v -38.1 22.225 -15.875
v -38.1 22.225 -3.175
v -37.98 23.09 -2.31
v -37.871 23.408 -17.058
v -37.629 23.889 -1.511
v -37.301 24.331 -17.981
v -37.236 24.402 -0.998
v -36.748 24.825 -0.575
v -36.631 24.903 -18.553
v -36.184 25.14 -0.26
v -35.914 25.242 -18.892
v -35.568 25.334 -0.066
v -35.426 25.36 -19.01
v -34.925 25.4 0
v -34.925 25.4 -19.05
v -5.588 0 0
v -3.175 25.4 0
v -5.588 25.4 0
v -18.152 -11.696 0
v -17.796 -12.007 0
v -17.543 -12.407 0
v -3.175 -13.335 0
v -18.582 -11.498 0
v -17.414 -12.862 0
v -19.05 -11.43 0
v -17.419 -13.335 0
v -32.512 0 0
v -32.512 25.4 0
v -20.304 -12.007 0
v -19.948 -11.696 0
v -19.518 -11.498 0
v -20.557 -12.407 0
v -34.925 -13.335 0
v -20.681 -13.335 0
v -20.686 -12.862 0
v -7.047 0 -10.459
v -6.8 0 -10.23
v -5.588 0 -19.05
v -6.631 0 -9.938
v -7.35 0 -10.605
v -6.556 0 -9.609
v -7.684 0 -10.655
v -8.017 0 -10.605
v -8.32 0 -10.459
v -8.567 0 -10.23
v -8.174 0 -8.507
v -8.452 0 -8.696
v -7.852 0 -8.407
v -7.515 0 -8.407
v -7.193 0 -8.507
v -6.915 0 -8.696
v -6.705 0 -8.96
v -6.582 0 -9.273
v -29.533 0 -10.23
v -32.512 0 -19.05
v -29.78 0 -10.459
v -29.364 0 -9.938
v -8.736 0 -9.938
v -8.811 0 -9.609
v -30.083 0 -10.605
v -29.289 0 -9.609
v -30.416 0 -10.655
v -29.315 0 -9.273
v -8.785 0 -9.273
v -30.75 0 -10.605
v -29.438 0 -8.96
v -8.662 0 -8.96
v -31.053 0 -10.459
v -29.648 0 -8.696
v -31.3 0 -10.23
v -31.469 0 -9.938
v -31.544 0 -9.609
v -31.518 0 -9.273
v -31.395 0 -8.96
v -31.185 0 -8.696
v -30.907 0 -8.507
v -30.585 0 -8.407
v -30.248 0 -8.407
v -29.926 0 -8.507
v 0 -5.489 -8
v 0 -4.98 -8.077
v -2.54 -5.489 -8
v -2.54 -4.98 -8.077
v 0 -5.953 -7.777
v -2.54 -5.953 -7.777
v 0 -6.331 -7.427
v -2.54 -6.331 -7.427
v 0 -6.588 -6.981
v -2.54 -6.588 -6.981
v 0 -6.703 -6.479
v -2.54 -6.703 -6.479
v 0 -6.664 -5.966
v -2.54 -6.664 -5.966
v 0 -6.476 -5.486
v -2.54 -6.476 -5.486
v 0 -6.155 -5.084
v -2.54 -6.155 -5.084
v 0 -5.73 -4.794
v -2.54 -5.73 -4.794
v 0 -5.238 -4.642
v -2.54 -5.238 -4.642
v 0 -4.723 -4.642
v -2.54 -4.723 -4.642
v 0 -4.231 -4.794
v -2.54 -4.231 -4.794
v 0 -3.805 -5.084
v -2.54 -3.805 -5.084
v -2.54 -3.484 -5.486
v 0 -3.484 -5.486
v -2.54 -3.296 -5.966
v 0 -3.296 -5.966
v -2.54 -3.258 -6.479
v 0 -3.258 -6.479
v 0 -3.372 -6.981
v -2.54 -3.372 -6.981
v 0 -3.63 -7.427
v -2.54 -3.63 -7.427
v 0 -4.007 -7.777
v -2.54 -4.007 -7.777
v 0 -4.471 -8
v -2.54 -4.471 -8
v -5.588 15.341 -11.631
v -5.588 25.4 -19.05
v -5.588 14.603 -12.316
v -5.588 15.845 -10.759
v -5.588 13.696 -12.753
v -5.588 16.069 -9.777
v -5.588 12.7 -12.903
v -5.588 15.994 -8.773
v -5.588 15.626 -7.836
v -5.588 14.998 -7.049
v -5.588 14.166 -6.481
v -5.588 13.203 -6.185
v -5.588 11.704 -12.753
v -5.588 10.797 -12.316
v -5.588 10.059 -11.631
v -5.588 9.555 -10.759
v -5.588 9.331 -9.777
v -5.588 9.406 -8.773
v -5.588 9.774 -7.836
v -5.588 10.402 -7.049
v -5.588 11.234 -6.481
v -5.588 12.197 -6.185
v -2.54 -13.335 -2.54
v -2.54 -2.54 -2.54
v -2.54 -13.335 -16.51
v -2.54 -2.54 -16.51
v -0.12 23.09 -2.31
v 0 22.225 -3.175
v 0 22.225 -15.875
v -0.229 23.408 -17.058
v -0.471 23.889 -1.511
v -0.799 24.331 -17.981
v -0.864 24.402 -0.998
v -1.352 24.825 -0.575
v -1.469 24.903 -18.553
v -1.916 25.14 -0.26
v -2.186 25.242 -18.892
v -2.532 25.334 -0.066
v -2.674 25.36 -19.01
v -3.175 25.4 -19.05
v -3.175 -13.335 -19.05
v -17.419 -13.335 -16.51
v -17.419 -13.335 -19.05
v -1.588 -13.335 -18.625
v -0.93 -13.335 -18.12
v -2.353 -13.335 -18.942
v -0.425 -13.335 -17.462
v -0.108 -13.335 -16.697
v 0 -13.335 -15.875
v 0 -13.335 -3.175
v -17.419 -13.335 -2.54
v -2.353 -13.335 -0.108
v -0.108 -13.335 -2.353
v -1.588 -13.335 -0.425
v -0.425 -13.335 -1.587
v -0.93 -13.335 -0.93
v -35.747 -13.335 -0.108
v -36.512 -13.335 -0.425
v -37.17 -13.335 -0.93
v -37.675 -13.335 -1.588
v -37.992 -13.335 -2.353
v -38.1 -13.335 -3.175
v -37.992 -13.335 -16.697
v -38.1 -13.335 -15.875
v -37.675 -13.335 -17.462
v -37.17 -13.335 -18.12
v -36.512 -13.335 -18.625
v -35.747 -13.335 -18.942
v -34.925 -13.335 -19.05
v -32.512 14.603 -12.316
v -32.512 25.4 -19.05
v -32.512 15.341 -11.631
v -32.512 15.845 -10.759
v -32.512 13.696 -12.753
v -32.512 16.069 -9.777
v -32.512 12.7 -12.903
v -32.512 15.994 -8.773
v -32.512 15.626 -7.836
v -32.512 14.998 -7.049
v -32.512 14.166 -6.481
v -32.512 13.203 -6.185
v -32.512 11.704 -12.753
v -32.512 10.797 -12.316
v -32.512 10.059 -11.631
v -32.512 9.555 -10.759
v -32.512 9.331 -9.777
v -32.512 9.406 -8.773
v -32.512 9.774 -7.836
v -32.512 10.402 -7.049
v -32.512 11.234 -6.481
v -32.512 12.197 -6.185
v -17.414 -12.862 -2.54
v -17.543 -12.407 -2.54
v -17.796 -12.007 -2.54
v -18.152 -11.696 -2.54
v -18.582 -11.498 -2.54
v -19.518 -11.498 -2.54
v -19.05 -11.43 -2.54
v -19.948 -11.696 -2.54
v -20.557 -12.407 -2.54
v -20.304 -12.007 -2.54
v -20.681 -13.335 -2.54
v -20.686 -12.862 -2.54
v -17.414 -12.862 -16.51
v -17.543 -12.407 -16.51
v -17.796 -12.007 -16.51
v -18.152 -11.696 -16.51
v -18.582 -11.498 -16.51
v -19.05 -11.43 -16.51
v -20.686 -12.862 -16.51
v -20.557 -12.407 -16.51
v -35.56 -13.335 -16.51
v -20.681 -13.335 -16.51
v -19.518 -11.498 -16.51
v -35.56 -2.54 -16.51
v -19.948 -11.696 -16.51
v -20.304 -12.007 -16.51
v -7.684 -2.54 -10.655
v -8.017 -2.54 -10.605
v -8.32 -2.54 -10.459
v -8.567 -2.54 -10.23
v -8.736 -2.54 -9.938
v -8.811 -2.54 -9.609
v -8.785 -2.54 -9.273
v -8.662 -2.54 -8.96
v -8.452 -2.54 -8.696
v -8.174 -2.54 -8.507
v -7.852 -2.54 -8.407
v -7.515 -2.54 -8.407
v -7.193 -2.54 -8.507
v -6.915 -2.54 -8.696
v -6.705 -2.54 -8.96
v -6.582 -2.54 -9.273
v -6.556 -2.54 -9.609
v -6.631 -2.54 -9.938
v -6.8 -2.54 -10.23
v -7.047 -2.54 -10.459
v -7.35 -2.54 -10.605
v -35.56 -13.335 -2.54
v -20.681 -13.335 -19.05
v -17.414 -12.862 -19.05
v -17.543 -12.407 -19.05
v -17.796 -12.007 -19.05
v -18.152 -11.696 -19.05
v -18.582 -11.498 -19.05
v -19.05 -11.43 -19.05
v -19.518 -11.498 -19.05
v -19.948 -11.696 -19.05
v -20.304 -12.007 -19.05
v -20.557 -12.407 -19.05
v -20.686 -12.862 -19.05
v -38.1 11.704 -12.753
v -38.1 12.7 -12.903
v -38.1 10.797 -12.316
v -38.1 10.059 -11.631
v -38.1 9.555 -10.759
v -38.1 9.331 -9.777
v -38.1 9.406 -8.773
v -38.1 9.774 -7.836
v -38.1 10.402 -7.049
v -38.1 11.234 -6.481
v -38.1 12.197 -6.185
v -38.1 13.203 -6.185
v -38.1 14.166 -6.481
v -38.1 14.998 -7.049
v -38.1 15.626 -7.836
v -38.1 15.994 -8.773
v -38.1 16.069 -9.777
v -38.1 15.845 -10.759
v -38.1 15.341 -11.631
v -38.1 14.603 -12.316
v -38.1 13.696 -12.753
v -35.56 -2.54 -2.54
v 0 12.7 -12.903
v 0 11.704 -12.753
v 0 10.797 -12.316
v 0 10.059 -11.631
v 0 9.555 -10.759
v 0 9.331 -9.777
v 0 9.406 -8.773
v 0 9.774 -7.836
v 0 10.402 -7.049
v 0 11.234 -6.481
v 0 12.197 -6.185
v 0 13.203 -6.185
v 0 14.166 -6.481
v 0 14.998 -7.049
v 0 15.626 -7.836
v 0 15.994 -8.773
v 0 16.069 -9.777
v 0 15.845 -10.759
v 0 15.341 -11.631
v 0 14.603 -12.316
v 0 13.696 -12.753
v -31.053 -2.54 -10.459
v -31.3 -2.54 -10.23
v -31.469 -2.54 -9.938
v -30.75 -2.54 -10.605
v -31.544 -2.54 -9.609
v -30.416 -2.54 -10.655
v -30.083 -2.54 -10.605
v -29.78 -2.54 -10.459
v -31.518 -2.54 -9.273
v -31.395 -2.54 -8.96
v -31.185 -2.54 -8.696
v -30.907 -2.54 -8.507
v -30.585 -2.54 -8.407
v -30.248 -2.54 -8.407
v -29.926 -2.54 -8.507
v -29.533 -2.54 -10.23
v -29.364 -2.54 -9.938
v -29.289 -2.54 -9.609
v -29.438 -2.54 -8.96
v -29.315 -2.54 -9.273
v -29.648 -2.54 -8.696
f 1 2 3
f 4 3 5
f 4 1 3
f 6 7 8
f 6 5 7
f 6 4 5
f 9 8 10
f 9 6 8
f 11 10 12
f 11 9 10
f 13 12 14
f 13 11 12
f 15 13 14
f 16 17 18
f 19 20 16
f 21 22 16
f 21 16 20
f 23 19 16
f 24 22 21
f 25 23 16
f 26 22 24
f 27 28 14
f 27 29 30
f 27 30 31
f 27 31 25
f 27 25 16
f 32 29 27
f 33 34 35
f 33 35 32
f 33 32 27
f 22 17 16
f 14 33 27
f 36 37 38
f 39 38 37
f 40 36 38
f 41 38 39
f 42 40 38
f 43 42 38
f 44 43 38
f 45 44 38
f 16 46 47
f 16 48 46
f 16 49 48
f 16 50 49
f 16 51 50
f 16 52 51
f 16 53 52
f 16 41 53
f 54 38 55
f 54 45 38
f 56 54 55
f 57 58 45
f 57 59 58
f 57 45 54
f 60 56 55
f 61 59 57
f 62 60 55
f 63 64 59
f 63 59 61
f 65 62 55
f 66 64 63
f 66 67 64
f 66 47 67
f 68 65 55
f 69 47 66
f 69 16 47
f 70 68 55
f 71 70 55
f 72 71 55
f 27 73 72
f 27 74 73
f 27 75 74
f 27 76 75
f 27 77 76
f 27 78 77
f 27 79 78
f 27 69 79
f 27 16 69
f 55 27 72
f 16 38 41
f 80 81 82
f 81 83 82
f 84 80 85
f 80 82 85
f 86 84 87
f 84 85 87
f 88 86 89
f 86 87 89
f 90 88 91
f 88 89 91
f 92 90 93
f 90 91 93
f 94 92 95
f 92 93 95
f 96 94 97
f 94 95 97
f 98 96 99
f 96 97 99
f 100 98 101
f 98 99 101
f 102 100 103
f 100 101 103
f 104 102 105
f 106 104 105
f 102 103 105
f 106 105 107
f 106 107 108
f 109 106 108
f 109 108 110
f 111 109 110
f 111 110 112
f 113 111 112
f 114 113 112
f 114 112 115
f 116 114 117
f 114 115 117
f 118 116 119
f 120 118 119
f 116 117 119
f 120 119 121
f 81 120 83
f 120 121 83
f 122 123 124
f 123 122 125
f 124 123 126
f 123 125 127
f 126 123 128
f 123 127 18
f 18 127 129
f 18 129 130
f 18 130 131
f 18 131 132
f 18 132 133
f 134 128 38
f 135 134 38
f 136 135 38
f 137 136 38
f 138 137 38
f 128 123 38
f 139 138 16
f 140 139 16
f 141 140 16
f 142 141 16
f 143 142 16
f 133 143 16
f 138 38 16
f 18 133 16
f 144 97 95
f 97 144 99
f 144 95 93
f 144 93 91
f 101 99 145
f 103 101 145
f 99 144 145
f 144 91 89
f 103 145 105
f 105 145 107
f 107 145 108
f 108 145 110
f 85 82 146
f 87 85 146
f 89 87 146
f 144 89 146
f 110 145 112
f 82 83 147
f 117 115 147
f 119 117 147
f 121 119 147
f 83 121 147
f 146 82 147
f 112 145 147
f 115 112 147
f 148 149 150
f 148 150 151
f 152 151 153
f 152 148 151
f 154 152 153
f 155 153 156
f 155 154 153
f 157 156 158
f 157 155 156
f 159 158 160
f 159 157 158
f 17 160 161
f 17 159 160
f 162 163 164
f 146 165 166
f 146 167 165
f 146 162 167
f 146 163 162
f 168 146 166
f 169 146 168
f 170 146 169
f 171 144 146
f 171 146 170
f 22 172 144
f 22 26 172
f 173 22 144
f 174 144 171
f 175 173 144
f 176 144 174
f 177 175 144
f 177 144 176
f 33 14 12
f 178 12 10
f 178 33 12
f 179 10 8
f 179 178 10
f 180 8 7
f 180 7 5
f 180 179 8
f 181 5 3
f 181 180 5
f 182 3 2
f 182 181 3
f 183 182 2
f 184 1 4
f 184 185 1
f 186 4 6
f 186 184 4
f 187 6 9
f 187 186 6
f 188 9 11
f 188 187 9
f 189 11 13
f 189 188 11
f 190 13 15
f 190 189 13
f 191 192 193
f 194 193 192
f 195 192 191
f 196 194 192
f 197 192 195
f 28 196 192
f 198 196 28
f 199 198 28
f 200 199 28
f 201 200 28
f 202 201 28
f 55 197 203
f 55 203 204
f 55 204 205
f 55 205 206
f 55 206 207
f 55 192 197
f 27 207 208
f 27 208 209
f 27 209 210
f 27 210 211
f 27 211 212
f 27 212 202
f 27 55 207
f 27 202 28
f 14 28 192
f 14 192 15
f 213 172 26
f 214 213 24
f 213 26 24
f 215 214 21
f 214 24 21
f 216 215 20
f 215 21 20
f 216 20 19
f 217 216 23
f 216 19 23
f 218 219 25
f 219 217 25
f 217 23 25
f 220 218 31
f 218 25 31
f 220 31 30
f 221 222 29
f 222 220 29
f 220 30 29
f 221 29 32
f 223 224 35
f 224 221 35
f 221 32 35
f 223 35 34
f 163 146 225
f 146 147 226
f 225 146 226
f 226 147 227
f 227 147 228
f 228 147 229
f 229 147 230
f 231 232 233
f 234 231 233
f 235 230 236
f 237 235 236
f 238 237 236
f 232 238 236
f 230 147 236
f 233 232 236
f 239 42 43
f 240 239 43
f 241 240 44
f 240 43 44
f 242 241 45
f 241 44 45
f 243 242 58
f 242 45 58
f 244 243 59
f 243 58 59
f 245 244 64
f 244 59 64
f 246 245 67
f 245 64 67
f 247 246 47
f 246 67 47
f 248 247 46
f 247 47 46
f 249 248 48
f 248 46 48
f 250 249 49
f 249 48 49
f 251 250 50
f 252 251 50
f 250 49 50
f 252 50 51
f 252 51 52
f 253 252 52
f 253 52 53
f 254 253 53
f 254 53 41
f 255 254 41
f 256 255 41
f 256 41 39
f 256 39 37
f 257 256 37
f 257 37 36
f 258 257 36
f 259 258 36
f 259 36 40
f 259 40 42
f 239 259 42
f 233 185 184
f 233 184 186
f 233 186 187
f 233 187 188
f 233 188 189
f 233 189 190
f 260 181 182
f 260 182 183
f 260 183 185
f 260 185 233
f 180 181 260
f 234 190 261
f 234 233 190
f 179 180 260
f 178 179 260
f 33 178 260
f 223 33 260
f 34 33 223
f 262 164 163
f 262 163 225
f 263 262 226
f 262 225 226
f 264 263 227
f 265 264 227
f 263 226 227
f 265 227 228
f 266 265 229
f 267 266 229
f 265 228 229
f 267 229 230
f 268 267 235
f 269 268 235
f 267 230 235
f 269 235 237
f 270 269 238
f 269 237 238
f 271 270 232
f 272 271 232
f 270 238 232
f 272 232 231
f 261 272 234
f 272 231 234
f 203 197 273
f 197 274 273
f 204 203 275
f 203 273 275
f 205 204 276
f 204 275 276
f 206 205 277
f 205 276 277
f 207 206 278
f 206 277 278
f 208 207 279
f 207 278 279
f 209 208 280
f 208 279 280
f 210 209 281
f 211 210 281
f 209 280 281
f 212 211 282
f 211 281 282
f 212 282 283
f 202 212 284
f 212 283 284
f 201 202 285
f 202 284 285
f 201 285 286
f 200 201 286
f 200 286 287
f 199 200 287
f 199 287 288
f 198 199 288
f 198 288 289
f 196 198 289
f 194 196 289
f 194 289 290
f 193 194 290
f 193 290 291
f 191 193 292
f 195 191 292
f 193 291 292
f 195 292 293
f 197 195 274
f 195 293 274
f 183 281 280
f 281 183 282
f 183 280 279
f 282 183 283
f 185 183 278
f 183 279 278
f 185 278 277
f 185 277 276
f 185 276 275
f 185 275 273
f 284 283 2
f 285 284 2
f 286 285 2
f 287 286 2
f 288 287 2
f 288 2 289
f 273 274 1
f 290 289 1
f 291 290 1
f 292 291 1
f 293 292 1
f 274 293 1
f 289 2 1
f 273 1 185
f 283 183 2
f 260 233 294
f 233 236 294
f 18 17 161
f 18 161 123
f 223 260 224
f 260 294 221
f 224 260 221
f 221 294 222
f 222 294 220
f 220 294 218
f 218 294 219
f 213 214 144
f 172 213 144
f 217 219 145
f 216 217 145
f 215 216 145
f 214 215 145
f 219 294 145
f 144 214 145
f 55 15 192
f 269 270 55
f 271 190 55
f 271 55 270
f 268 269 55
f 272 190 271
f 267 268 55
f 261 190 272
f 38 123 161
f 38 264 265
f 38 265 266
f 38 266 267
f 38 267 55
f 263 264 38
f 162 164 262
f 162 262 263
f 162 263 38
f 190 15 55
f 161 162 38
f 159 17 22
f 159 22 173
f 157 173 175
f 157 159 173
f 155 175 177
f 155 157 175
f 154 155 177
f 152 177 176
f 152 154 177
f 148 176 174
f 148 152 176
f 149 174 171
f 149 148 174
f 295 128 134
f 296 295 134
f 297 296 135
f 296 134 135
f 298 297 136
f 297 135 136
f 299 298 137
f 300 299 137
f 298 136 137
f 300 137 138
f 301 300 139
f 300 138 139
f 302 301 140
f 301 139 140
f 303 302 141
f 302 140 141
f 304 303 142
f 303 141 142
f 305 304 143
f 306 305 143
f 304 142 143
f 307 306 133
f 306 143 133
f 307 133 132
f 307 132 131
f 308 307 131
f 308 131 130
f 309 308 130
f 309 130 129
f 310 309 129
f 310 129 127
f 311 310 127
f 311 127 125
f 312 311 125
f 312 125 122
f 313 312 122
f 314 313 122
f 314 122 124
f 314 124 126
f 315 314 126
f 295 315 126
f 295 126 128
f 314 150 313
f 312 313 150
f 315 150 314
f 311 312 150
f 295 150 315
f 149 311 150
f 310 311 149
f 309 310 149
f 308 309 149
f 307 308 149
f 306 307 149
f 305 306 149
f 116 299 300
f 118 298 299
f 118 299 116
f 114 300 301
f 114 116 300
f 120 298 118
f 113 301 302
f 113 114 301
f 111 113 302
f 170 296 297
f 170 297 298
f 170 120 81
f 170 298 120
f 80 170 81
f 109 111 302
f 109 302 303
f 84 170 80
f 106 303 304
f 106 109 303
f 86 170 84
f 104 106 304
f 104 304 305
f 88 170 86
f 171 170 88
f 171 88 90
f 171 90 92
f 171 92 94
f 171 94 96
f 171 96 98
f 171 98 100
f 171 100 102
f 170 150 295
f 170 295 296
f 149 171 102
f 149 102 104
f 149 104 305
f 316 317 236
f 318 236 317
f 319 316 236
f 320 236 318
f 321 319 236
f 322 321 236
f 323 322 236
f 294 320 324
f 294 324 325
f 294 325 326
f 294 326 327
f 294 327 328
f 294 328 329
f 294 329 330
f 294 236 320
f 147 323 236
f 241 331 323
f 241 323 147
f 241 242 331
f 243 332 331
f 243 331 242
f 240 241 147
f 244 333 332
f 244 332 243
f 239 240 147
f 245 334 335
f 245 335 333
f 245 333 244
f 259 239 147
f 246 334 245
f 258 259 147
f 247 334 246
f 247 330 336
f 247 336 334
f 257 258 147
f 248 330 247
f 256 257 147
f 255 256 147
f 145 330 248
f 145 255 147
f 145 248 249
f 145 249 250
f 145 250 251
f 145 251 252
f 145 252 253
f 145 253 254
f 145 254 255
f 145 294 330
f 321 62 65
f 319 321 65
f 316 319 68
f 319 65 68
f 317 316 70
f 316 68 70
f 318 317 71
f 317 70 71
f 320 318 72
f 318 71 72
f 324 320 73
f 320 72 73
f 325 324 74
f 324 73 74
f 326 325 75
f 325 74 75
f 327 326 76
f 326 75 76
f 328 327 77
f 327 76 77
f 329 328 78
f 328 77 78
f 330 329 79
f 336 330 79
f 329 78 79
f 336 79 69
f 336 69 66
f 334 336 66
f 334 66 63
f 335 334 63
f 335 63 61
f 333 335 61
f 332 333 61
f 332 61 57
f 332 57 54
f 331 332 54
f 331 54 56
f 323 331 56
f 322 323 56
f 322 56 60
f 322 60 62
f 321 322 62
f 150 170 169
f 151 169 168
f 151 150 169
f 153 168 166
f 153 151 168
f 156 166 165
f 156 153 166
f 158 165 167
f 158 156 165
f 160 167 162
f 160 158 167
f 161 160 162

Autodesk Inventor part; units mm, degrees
ref_plane "YZ Plane" through (0, 0, 0) normal (1, 0, 0) x (0, 1, 0)
ref_plane "XZ Plane" through (0, 0, 0) normal (0, 1, 0) x (-1, 0, 0)
ref_plane "XY Plane" through (0, 0, 0) normal (0, 0, 1) x (1, 0, 0)
sketch "Sketch1" plane through (0, 0, 0) normal (0, 1, 0) x (-1, 0, 0)
  line L0 (0, 0) -> (38.1, 0)
  line L1 (38.1, 0) -> (38.1, -19.05)
  line L2 (38.1, -19.05) -> (0, -19.05)
  line L3 (0, -19.05) -> (0, 0)
  line L4 (38.1, -19.05) -> (32.512, -19.05)
  line L5 (32.512, -19.05) -> (32.512, 0)
  line L6 (32.512, 0) -> (38.1, 0)
  line L7 (38.1, 0) -> (38.1, -19.05)
  line L8 (0, -19.05) -> (5.588, -19.05)
  line L9 (5.588, -19.05) -> (5.588, 0)
  line L10 (5.588, 0) -> (0, 0)
  line L11 (0, 0) -> (0, -19.05)
  point P0 (5.588, -19.05)
  dimension "d0" = 38.1
  dimension "d1" = 19.05
  dimension "d2" = 5.588
  dimension "d3" = 5.588
extrude "Extrusion1" add sketch "Sketch1" along normal blind 25.4 contours L0 L9 L2 L3 | L0 L1 L2 L5
extrude "Extrusion2" add sketch "Sketch1" against normal blind 5.08
sketch "Sketch2" plane through (0, 25.4, 0) normal (1, 0, 0) x (0, 0, -1)
  line L0 (19.05, 0) -> (0, 0) projected
  line L1 (9.525, 0) -> (9.525, -12.7)
  point P0 (0, -25.4)
  dimension "d8" = 12.7
hole "Hole1" at (0, 12.7, -9.525) direction (-1, 0, 0) diameter 6.7564 end through all clearance for "Socket Head Cap Screw" size "1/4" standard "Ansi Unified Screw Threads"
sketch "Sketch3" plane through (0, -5.08, 0) normal (0, -1, 0) x (1, 0, 0)
  line L0 (0, 0) -> (-38.1, 0) projected
  line L1 (-38.1, 0) -> (-35.56, 0)
  line L2 (-35.56, 0) -> (-35.56, -2.54)
  line L3 (-35.56, -2.54) -> (-38.1, -2.54)
  line L4 (-38.1, -2.54) -> (-38.1, 0)
  line L5 (0, -19.05) -> (-2.54, -19.05)
  line L6 (-2.54, -19.05) -> (-2.54, -16.51)
  line L7 (-2.54, -16.51) -> (0, -16.51)
  line L8 (0, -16.51) -> (0, -19.05)
  line L9 (-35.56, -2.54) -> (-2.54, -2.54)
  line L10 (-2.54, -2.54) -> (-2.54, -16.51)
  line L11 (-2.54, -16.51) -> (-35.56, -16.51)
  line L12 (-35.56, -16.51) -> (-35.56, -2.54)
  line L13 (-38.1, 0) -> (-38.1, -19.05) projected
  line L14 (0, -19.05) -> (0, 0) projected
  line L15 (-38.1, -19.05) -> (0, -19.05) projected
  dimension "d16" = 2.54
  dimension "d17" = 2.54
  dimension "d18" = 2.54
  dimension "d19" = 2.54
extrude "Extrusion3" cut sketch "Sketch3" against normal blind 2.54 contours L9 L10 L11 L12
extrude "Extrusion4" add sketch "Sketch3" along normal blind 8.255 contours L14 L7 L10 L9 L2 L0 | L2 L3 L4 L0 | L8 L5 L6 L7 | L12 L11 L6 L15 L13 L3
sketch "Sketch4" plane through (0, 25.4, 0) normal (1, 0, 0) x (0, 0, -1)
  line L0 (19.05, -38.735) -> (19.05, 0) projected
  line L1 (19.05, -30.3802) -> (6.35, -30.3802)
  line L2 (19.05, -30.3802) -> (31.75, -30.3802) construction
  point P0 (0, -25.4)
  dimension "d24" = 12.7
  dimension "d25" = 180
hole "Hole2" at (0, -4.9802, -6.35) direction (-1, 0, 0) diameter 3.4544 depth 2.54
sketch "Sketch5" plane through (0, -2.54, 0) normal (0, -1, 0) x (1, 0, 0)
  line L0 (-2.54, -16.51) -> (-35.56, -16.51) projected
  line L1 (-19.05, -16.51) -> (-19.05, -2.54)
  line L2 (-35.56, -2.54) -> (-2.54, -2.54) projected
  line L3 (-35.56, -2.54) -> (-2.54, -2.54) projected
  line L4 (-19.05, -16.51) -> (-19.05, -9.525)
  line L5 (-4.2545, -5.715) -> (-33.8455, -5.715)
  line L6 (-33.8455, -5.715) -> (-33.8455, -13.335)
  line L7 (-33.8455, -13.335) -> (-4.2545, -13.335)
  line L8 (-4.2545, -13.335) -> (-4.2545, -5.715)
  line L9 (-4.2545, -5.715) -> (-33.8455, -13.335) construction
  line L10 (-33.8455, -5.715) -> (-4.2545, -13.335) construction
  line L11 (-19.05, -9.525) -> (-30.4165, -9.525)
  line L12 (-30.4165, -9.525) -> (-7.6835, -9.525)
  point P0 (0, 0)
  dimension "d33" = 6.985
  dimension "d34" = 29.591
  dimension "d35" = 7.62
  dimension "d36" = 11.3665
  dimension "d37" = 22.733
hole "Hole3" at (-7.6835, -2.54, -9.525) at (-30.4165, -2.54, -9.525) direction (0, 1, 0) diameter 2.2606 end through all
sketch "Sketch6" plane through (-35.56, -2.54, -16.51) normal (0, 0, 1) x (1, 0, 0)
  line L0 (33.02, 0) -> (0, 0) projected
  line L1 (16.51, 0) -> (16.51, -10.541)
  point P0 (35.56, 2.54)
  dimension "d45" = 10.541
hole "Hole4" at (-19.05, -13.081, -16.51) direction (0, 0, 1) diameter 3.302 end through all both
fillet "Fillet1" radius 3.175 6 edges at (-38.1, 6.0325, 0) (0, 6.0325, 0) (0, 6.0325, -19.05) (0, 25.4, -9.525) (-38.1, 6.0325, -19.05) (-38.1, 25.4, -9.525)
properties part number "HomemadeSensorHousing 8020"
